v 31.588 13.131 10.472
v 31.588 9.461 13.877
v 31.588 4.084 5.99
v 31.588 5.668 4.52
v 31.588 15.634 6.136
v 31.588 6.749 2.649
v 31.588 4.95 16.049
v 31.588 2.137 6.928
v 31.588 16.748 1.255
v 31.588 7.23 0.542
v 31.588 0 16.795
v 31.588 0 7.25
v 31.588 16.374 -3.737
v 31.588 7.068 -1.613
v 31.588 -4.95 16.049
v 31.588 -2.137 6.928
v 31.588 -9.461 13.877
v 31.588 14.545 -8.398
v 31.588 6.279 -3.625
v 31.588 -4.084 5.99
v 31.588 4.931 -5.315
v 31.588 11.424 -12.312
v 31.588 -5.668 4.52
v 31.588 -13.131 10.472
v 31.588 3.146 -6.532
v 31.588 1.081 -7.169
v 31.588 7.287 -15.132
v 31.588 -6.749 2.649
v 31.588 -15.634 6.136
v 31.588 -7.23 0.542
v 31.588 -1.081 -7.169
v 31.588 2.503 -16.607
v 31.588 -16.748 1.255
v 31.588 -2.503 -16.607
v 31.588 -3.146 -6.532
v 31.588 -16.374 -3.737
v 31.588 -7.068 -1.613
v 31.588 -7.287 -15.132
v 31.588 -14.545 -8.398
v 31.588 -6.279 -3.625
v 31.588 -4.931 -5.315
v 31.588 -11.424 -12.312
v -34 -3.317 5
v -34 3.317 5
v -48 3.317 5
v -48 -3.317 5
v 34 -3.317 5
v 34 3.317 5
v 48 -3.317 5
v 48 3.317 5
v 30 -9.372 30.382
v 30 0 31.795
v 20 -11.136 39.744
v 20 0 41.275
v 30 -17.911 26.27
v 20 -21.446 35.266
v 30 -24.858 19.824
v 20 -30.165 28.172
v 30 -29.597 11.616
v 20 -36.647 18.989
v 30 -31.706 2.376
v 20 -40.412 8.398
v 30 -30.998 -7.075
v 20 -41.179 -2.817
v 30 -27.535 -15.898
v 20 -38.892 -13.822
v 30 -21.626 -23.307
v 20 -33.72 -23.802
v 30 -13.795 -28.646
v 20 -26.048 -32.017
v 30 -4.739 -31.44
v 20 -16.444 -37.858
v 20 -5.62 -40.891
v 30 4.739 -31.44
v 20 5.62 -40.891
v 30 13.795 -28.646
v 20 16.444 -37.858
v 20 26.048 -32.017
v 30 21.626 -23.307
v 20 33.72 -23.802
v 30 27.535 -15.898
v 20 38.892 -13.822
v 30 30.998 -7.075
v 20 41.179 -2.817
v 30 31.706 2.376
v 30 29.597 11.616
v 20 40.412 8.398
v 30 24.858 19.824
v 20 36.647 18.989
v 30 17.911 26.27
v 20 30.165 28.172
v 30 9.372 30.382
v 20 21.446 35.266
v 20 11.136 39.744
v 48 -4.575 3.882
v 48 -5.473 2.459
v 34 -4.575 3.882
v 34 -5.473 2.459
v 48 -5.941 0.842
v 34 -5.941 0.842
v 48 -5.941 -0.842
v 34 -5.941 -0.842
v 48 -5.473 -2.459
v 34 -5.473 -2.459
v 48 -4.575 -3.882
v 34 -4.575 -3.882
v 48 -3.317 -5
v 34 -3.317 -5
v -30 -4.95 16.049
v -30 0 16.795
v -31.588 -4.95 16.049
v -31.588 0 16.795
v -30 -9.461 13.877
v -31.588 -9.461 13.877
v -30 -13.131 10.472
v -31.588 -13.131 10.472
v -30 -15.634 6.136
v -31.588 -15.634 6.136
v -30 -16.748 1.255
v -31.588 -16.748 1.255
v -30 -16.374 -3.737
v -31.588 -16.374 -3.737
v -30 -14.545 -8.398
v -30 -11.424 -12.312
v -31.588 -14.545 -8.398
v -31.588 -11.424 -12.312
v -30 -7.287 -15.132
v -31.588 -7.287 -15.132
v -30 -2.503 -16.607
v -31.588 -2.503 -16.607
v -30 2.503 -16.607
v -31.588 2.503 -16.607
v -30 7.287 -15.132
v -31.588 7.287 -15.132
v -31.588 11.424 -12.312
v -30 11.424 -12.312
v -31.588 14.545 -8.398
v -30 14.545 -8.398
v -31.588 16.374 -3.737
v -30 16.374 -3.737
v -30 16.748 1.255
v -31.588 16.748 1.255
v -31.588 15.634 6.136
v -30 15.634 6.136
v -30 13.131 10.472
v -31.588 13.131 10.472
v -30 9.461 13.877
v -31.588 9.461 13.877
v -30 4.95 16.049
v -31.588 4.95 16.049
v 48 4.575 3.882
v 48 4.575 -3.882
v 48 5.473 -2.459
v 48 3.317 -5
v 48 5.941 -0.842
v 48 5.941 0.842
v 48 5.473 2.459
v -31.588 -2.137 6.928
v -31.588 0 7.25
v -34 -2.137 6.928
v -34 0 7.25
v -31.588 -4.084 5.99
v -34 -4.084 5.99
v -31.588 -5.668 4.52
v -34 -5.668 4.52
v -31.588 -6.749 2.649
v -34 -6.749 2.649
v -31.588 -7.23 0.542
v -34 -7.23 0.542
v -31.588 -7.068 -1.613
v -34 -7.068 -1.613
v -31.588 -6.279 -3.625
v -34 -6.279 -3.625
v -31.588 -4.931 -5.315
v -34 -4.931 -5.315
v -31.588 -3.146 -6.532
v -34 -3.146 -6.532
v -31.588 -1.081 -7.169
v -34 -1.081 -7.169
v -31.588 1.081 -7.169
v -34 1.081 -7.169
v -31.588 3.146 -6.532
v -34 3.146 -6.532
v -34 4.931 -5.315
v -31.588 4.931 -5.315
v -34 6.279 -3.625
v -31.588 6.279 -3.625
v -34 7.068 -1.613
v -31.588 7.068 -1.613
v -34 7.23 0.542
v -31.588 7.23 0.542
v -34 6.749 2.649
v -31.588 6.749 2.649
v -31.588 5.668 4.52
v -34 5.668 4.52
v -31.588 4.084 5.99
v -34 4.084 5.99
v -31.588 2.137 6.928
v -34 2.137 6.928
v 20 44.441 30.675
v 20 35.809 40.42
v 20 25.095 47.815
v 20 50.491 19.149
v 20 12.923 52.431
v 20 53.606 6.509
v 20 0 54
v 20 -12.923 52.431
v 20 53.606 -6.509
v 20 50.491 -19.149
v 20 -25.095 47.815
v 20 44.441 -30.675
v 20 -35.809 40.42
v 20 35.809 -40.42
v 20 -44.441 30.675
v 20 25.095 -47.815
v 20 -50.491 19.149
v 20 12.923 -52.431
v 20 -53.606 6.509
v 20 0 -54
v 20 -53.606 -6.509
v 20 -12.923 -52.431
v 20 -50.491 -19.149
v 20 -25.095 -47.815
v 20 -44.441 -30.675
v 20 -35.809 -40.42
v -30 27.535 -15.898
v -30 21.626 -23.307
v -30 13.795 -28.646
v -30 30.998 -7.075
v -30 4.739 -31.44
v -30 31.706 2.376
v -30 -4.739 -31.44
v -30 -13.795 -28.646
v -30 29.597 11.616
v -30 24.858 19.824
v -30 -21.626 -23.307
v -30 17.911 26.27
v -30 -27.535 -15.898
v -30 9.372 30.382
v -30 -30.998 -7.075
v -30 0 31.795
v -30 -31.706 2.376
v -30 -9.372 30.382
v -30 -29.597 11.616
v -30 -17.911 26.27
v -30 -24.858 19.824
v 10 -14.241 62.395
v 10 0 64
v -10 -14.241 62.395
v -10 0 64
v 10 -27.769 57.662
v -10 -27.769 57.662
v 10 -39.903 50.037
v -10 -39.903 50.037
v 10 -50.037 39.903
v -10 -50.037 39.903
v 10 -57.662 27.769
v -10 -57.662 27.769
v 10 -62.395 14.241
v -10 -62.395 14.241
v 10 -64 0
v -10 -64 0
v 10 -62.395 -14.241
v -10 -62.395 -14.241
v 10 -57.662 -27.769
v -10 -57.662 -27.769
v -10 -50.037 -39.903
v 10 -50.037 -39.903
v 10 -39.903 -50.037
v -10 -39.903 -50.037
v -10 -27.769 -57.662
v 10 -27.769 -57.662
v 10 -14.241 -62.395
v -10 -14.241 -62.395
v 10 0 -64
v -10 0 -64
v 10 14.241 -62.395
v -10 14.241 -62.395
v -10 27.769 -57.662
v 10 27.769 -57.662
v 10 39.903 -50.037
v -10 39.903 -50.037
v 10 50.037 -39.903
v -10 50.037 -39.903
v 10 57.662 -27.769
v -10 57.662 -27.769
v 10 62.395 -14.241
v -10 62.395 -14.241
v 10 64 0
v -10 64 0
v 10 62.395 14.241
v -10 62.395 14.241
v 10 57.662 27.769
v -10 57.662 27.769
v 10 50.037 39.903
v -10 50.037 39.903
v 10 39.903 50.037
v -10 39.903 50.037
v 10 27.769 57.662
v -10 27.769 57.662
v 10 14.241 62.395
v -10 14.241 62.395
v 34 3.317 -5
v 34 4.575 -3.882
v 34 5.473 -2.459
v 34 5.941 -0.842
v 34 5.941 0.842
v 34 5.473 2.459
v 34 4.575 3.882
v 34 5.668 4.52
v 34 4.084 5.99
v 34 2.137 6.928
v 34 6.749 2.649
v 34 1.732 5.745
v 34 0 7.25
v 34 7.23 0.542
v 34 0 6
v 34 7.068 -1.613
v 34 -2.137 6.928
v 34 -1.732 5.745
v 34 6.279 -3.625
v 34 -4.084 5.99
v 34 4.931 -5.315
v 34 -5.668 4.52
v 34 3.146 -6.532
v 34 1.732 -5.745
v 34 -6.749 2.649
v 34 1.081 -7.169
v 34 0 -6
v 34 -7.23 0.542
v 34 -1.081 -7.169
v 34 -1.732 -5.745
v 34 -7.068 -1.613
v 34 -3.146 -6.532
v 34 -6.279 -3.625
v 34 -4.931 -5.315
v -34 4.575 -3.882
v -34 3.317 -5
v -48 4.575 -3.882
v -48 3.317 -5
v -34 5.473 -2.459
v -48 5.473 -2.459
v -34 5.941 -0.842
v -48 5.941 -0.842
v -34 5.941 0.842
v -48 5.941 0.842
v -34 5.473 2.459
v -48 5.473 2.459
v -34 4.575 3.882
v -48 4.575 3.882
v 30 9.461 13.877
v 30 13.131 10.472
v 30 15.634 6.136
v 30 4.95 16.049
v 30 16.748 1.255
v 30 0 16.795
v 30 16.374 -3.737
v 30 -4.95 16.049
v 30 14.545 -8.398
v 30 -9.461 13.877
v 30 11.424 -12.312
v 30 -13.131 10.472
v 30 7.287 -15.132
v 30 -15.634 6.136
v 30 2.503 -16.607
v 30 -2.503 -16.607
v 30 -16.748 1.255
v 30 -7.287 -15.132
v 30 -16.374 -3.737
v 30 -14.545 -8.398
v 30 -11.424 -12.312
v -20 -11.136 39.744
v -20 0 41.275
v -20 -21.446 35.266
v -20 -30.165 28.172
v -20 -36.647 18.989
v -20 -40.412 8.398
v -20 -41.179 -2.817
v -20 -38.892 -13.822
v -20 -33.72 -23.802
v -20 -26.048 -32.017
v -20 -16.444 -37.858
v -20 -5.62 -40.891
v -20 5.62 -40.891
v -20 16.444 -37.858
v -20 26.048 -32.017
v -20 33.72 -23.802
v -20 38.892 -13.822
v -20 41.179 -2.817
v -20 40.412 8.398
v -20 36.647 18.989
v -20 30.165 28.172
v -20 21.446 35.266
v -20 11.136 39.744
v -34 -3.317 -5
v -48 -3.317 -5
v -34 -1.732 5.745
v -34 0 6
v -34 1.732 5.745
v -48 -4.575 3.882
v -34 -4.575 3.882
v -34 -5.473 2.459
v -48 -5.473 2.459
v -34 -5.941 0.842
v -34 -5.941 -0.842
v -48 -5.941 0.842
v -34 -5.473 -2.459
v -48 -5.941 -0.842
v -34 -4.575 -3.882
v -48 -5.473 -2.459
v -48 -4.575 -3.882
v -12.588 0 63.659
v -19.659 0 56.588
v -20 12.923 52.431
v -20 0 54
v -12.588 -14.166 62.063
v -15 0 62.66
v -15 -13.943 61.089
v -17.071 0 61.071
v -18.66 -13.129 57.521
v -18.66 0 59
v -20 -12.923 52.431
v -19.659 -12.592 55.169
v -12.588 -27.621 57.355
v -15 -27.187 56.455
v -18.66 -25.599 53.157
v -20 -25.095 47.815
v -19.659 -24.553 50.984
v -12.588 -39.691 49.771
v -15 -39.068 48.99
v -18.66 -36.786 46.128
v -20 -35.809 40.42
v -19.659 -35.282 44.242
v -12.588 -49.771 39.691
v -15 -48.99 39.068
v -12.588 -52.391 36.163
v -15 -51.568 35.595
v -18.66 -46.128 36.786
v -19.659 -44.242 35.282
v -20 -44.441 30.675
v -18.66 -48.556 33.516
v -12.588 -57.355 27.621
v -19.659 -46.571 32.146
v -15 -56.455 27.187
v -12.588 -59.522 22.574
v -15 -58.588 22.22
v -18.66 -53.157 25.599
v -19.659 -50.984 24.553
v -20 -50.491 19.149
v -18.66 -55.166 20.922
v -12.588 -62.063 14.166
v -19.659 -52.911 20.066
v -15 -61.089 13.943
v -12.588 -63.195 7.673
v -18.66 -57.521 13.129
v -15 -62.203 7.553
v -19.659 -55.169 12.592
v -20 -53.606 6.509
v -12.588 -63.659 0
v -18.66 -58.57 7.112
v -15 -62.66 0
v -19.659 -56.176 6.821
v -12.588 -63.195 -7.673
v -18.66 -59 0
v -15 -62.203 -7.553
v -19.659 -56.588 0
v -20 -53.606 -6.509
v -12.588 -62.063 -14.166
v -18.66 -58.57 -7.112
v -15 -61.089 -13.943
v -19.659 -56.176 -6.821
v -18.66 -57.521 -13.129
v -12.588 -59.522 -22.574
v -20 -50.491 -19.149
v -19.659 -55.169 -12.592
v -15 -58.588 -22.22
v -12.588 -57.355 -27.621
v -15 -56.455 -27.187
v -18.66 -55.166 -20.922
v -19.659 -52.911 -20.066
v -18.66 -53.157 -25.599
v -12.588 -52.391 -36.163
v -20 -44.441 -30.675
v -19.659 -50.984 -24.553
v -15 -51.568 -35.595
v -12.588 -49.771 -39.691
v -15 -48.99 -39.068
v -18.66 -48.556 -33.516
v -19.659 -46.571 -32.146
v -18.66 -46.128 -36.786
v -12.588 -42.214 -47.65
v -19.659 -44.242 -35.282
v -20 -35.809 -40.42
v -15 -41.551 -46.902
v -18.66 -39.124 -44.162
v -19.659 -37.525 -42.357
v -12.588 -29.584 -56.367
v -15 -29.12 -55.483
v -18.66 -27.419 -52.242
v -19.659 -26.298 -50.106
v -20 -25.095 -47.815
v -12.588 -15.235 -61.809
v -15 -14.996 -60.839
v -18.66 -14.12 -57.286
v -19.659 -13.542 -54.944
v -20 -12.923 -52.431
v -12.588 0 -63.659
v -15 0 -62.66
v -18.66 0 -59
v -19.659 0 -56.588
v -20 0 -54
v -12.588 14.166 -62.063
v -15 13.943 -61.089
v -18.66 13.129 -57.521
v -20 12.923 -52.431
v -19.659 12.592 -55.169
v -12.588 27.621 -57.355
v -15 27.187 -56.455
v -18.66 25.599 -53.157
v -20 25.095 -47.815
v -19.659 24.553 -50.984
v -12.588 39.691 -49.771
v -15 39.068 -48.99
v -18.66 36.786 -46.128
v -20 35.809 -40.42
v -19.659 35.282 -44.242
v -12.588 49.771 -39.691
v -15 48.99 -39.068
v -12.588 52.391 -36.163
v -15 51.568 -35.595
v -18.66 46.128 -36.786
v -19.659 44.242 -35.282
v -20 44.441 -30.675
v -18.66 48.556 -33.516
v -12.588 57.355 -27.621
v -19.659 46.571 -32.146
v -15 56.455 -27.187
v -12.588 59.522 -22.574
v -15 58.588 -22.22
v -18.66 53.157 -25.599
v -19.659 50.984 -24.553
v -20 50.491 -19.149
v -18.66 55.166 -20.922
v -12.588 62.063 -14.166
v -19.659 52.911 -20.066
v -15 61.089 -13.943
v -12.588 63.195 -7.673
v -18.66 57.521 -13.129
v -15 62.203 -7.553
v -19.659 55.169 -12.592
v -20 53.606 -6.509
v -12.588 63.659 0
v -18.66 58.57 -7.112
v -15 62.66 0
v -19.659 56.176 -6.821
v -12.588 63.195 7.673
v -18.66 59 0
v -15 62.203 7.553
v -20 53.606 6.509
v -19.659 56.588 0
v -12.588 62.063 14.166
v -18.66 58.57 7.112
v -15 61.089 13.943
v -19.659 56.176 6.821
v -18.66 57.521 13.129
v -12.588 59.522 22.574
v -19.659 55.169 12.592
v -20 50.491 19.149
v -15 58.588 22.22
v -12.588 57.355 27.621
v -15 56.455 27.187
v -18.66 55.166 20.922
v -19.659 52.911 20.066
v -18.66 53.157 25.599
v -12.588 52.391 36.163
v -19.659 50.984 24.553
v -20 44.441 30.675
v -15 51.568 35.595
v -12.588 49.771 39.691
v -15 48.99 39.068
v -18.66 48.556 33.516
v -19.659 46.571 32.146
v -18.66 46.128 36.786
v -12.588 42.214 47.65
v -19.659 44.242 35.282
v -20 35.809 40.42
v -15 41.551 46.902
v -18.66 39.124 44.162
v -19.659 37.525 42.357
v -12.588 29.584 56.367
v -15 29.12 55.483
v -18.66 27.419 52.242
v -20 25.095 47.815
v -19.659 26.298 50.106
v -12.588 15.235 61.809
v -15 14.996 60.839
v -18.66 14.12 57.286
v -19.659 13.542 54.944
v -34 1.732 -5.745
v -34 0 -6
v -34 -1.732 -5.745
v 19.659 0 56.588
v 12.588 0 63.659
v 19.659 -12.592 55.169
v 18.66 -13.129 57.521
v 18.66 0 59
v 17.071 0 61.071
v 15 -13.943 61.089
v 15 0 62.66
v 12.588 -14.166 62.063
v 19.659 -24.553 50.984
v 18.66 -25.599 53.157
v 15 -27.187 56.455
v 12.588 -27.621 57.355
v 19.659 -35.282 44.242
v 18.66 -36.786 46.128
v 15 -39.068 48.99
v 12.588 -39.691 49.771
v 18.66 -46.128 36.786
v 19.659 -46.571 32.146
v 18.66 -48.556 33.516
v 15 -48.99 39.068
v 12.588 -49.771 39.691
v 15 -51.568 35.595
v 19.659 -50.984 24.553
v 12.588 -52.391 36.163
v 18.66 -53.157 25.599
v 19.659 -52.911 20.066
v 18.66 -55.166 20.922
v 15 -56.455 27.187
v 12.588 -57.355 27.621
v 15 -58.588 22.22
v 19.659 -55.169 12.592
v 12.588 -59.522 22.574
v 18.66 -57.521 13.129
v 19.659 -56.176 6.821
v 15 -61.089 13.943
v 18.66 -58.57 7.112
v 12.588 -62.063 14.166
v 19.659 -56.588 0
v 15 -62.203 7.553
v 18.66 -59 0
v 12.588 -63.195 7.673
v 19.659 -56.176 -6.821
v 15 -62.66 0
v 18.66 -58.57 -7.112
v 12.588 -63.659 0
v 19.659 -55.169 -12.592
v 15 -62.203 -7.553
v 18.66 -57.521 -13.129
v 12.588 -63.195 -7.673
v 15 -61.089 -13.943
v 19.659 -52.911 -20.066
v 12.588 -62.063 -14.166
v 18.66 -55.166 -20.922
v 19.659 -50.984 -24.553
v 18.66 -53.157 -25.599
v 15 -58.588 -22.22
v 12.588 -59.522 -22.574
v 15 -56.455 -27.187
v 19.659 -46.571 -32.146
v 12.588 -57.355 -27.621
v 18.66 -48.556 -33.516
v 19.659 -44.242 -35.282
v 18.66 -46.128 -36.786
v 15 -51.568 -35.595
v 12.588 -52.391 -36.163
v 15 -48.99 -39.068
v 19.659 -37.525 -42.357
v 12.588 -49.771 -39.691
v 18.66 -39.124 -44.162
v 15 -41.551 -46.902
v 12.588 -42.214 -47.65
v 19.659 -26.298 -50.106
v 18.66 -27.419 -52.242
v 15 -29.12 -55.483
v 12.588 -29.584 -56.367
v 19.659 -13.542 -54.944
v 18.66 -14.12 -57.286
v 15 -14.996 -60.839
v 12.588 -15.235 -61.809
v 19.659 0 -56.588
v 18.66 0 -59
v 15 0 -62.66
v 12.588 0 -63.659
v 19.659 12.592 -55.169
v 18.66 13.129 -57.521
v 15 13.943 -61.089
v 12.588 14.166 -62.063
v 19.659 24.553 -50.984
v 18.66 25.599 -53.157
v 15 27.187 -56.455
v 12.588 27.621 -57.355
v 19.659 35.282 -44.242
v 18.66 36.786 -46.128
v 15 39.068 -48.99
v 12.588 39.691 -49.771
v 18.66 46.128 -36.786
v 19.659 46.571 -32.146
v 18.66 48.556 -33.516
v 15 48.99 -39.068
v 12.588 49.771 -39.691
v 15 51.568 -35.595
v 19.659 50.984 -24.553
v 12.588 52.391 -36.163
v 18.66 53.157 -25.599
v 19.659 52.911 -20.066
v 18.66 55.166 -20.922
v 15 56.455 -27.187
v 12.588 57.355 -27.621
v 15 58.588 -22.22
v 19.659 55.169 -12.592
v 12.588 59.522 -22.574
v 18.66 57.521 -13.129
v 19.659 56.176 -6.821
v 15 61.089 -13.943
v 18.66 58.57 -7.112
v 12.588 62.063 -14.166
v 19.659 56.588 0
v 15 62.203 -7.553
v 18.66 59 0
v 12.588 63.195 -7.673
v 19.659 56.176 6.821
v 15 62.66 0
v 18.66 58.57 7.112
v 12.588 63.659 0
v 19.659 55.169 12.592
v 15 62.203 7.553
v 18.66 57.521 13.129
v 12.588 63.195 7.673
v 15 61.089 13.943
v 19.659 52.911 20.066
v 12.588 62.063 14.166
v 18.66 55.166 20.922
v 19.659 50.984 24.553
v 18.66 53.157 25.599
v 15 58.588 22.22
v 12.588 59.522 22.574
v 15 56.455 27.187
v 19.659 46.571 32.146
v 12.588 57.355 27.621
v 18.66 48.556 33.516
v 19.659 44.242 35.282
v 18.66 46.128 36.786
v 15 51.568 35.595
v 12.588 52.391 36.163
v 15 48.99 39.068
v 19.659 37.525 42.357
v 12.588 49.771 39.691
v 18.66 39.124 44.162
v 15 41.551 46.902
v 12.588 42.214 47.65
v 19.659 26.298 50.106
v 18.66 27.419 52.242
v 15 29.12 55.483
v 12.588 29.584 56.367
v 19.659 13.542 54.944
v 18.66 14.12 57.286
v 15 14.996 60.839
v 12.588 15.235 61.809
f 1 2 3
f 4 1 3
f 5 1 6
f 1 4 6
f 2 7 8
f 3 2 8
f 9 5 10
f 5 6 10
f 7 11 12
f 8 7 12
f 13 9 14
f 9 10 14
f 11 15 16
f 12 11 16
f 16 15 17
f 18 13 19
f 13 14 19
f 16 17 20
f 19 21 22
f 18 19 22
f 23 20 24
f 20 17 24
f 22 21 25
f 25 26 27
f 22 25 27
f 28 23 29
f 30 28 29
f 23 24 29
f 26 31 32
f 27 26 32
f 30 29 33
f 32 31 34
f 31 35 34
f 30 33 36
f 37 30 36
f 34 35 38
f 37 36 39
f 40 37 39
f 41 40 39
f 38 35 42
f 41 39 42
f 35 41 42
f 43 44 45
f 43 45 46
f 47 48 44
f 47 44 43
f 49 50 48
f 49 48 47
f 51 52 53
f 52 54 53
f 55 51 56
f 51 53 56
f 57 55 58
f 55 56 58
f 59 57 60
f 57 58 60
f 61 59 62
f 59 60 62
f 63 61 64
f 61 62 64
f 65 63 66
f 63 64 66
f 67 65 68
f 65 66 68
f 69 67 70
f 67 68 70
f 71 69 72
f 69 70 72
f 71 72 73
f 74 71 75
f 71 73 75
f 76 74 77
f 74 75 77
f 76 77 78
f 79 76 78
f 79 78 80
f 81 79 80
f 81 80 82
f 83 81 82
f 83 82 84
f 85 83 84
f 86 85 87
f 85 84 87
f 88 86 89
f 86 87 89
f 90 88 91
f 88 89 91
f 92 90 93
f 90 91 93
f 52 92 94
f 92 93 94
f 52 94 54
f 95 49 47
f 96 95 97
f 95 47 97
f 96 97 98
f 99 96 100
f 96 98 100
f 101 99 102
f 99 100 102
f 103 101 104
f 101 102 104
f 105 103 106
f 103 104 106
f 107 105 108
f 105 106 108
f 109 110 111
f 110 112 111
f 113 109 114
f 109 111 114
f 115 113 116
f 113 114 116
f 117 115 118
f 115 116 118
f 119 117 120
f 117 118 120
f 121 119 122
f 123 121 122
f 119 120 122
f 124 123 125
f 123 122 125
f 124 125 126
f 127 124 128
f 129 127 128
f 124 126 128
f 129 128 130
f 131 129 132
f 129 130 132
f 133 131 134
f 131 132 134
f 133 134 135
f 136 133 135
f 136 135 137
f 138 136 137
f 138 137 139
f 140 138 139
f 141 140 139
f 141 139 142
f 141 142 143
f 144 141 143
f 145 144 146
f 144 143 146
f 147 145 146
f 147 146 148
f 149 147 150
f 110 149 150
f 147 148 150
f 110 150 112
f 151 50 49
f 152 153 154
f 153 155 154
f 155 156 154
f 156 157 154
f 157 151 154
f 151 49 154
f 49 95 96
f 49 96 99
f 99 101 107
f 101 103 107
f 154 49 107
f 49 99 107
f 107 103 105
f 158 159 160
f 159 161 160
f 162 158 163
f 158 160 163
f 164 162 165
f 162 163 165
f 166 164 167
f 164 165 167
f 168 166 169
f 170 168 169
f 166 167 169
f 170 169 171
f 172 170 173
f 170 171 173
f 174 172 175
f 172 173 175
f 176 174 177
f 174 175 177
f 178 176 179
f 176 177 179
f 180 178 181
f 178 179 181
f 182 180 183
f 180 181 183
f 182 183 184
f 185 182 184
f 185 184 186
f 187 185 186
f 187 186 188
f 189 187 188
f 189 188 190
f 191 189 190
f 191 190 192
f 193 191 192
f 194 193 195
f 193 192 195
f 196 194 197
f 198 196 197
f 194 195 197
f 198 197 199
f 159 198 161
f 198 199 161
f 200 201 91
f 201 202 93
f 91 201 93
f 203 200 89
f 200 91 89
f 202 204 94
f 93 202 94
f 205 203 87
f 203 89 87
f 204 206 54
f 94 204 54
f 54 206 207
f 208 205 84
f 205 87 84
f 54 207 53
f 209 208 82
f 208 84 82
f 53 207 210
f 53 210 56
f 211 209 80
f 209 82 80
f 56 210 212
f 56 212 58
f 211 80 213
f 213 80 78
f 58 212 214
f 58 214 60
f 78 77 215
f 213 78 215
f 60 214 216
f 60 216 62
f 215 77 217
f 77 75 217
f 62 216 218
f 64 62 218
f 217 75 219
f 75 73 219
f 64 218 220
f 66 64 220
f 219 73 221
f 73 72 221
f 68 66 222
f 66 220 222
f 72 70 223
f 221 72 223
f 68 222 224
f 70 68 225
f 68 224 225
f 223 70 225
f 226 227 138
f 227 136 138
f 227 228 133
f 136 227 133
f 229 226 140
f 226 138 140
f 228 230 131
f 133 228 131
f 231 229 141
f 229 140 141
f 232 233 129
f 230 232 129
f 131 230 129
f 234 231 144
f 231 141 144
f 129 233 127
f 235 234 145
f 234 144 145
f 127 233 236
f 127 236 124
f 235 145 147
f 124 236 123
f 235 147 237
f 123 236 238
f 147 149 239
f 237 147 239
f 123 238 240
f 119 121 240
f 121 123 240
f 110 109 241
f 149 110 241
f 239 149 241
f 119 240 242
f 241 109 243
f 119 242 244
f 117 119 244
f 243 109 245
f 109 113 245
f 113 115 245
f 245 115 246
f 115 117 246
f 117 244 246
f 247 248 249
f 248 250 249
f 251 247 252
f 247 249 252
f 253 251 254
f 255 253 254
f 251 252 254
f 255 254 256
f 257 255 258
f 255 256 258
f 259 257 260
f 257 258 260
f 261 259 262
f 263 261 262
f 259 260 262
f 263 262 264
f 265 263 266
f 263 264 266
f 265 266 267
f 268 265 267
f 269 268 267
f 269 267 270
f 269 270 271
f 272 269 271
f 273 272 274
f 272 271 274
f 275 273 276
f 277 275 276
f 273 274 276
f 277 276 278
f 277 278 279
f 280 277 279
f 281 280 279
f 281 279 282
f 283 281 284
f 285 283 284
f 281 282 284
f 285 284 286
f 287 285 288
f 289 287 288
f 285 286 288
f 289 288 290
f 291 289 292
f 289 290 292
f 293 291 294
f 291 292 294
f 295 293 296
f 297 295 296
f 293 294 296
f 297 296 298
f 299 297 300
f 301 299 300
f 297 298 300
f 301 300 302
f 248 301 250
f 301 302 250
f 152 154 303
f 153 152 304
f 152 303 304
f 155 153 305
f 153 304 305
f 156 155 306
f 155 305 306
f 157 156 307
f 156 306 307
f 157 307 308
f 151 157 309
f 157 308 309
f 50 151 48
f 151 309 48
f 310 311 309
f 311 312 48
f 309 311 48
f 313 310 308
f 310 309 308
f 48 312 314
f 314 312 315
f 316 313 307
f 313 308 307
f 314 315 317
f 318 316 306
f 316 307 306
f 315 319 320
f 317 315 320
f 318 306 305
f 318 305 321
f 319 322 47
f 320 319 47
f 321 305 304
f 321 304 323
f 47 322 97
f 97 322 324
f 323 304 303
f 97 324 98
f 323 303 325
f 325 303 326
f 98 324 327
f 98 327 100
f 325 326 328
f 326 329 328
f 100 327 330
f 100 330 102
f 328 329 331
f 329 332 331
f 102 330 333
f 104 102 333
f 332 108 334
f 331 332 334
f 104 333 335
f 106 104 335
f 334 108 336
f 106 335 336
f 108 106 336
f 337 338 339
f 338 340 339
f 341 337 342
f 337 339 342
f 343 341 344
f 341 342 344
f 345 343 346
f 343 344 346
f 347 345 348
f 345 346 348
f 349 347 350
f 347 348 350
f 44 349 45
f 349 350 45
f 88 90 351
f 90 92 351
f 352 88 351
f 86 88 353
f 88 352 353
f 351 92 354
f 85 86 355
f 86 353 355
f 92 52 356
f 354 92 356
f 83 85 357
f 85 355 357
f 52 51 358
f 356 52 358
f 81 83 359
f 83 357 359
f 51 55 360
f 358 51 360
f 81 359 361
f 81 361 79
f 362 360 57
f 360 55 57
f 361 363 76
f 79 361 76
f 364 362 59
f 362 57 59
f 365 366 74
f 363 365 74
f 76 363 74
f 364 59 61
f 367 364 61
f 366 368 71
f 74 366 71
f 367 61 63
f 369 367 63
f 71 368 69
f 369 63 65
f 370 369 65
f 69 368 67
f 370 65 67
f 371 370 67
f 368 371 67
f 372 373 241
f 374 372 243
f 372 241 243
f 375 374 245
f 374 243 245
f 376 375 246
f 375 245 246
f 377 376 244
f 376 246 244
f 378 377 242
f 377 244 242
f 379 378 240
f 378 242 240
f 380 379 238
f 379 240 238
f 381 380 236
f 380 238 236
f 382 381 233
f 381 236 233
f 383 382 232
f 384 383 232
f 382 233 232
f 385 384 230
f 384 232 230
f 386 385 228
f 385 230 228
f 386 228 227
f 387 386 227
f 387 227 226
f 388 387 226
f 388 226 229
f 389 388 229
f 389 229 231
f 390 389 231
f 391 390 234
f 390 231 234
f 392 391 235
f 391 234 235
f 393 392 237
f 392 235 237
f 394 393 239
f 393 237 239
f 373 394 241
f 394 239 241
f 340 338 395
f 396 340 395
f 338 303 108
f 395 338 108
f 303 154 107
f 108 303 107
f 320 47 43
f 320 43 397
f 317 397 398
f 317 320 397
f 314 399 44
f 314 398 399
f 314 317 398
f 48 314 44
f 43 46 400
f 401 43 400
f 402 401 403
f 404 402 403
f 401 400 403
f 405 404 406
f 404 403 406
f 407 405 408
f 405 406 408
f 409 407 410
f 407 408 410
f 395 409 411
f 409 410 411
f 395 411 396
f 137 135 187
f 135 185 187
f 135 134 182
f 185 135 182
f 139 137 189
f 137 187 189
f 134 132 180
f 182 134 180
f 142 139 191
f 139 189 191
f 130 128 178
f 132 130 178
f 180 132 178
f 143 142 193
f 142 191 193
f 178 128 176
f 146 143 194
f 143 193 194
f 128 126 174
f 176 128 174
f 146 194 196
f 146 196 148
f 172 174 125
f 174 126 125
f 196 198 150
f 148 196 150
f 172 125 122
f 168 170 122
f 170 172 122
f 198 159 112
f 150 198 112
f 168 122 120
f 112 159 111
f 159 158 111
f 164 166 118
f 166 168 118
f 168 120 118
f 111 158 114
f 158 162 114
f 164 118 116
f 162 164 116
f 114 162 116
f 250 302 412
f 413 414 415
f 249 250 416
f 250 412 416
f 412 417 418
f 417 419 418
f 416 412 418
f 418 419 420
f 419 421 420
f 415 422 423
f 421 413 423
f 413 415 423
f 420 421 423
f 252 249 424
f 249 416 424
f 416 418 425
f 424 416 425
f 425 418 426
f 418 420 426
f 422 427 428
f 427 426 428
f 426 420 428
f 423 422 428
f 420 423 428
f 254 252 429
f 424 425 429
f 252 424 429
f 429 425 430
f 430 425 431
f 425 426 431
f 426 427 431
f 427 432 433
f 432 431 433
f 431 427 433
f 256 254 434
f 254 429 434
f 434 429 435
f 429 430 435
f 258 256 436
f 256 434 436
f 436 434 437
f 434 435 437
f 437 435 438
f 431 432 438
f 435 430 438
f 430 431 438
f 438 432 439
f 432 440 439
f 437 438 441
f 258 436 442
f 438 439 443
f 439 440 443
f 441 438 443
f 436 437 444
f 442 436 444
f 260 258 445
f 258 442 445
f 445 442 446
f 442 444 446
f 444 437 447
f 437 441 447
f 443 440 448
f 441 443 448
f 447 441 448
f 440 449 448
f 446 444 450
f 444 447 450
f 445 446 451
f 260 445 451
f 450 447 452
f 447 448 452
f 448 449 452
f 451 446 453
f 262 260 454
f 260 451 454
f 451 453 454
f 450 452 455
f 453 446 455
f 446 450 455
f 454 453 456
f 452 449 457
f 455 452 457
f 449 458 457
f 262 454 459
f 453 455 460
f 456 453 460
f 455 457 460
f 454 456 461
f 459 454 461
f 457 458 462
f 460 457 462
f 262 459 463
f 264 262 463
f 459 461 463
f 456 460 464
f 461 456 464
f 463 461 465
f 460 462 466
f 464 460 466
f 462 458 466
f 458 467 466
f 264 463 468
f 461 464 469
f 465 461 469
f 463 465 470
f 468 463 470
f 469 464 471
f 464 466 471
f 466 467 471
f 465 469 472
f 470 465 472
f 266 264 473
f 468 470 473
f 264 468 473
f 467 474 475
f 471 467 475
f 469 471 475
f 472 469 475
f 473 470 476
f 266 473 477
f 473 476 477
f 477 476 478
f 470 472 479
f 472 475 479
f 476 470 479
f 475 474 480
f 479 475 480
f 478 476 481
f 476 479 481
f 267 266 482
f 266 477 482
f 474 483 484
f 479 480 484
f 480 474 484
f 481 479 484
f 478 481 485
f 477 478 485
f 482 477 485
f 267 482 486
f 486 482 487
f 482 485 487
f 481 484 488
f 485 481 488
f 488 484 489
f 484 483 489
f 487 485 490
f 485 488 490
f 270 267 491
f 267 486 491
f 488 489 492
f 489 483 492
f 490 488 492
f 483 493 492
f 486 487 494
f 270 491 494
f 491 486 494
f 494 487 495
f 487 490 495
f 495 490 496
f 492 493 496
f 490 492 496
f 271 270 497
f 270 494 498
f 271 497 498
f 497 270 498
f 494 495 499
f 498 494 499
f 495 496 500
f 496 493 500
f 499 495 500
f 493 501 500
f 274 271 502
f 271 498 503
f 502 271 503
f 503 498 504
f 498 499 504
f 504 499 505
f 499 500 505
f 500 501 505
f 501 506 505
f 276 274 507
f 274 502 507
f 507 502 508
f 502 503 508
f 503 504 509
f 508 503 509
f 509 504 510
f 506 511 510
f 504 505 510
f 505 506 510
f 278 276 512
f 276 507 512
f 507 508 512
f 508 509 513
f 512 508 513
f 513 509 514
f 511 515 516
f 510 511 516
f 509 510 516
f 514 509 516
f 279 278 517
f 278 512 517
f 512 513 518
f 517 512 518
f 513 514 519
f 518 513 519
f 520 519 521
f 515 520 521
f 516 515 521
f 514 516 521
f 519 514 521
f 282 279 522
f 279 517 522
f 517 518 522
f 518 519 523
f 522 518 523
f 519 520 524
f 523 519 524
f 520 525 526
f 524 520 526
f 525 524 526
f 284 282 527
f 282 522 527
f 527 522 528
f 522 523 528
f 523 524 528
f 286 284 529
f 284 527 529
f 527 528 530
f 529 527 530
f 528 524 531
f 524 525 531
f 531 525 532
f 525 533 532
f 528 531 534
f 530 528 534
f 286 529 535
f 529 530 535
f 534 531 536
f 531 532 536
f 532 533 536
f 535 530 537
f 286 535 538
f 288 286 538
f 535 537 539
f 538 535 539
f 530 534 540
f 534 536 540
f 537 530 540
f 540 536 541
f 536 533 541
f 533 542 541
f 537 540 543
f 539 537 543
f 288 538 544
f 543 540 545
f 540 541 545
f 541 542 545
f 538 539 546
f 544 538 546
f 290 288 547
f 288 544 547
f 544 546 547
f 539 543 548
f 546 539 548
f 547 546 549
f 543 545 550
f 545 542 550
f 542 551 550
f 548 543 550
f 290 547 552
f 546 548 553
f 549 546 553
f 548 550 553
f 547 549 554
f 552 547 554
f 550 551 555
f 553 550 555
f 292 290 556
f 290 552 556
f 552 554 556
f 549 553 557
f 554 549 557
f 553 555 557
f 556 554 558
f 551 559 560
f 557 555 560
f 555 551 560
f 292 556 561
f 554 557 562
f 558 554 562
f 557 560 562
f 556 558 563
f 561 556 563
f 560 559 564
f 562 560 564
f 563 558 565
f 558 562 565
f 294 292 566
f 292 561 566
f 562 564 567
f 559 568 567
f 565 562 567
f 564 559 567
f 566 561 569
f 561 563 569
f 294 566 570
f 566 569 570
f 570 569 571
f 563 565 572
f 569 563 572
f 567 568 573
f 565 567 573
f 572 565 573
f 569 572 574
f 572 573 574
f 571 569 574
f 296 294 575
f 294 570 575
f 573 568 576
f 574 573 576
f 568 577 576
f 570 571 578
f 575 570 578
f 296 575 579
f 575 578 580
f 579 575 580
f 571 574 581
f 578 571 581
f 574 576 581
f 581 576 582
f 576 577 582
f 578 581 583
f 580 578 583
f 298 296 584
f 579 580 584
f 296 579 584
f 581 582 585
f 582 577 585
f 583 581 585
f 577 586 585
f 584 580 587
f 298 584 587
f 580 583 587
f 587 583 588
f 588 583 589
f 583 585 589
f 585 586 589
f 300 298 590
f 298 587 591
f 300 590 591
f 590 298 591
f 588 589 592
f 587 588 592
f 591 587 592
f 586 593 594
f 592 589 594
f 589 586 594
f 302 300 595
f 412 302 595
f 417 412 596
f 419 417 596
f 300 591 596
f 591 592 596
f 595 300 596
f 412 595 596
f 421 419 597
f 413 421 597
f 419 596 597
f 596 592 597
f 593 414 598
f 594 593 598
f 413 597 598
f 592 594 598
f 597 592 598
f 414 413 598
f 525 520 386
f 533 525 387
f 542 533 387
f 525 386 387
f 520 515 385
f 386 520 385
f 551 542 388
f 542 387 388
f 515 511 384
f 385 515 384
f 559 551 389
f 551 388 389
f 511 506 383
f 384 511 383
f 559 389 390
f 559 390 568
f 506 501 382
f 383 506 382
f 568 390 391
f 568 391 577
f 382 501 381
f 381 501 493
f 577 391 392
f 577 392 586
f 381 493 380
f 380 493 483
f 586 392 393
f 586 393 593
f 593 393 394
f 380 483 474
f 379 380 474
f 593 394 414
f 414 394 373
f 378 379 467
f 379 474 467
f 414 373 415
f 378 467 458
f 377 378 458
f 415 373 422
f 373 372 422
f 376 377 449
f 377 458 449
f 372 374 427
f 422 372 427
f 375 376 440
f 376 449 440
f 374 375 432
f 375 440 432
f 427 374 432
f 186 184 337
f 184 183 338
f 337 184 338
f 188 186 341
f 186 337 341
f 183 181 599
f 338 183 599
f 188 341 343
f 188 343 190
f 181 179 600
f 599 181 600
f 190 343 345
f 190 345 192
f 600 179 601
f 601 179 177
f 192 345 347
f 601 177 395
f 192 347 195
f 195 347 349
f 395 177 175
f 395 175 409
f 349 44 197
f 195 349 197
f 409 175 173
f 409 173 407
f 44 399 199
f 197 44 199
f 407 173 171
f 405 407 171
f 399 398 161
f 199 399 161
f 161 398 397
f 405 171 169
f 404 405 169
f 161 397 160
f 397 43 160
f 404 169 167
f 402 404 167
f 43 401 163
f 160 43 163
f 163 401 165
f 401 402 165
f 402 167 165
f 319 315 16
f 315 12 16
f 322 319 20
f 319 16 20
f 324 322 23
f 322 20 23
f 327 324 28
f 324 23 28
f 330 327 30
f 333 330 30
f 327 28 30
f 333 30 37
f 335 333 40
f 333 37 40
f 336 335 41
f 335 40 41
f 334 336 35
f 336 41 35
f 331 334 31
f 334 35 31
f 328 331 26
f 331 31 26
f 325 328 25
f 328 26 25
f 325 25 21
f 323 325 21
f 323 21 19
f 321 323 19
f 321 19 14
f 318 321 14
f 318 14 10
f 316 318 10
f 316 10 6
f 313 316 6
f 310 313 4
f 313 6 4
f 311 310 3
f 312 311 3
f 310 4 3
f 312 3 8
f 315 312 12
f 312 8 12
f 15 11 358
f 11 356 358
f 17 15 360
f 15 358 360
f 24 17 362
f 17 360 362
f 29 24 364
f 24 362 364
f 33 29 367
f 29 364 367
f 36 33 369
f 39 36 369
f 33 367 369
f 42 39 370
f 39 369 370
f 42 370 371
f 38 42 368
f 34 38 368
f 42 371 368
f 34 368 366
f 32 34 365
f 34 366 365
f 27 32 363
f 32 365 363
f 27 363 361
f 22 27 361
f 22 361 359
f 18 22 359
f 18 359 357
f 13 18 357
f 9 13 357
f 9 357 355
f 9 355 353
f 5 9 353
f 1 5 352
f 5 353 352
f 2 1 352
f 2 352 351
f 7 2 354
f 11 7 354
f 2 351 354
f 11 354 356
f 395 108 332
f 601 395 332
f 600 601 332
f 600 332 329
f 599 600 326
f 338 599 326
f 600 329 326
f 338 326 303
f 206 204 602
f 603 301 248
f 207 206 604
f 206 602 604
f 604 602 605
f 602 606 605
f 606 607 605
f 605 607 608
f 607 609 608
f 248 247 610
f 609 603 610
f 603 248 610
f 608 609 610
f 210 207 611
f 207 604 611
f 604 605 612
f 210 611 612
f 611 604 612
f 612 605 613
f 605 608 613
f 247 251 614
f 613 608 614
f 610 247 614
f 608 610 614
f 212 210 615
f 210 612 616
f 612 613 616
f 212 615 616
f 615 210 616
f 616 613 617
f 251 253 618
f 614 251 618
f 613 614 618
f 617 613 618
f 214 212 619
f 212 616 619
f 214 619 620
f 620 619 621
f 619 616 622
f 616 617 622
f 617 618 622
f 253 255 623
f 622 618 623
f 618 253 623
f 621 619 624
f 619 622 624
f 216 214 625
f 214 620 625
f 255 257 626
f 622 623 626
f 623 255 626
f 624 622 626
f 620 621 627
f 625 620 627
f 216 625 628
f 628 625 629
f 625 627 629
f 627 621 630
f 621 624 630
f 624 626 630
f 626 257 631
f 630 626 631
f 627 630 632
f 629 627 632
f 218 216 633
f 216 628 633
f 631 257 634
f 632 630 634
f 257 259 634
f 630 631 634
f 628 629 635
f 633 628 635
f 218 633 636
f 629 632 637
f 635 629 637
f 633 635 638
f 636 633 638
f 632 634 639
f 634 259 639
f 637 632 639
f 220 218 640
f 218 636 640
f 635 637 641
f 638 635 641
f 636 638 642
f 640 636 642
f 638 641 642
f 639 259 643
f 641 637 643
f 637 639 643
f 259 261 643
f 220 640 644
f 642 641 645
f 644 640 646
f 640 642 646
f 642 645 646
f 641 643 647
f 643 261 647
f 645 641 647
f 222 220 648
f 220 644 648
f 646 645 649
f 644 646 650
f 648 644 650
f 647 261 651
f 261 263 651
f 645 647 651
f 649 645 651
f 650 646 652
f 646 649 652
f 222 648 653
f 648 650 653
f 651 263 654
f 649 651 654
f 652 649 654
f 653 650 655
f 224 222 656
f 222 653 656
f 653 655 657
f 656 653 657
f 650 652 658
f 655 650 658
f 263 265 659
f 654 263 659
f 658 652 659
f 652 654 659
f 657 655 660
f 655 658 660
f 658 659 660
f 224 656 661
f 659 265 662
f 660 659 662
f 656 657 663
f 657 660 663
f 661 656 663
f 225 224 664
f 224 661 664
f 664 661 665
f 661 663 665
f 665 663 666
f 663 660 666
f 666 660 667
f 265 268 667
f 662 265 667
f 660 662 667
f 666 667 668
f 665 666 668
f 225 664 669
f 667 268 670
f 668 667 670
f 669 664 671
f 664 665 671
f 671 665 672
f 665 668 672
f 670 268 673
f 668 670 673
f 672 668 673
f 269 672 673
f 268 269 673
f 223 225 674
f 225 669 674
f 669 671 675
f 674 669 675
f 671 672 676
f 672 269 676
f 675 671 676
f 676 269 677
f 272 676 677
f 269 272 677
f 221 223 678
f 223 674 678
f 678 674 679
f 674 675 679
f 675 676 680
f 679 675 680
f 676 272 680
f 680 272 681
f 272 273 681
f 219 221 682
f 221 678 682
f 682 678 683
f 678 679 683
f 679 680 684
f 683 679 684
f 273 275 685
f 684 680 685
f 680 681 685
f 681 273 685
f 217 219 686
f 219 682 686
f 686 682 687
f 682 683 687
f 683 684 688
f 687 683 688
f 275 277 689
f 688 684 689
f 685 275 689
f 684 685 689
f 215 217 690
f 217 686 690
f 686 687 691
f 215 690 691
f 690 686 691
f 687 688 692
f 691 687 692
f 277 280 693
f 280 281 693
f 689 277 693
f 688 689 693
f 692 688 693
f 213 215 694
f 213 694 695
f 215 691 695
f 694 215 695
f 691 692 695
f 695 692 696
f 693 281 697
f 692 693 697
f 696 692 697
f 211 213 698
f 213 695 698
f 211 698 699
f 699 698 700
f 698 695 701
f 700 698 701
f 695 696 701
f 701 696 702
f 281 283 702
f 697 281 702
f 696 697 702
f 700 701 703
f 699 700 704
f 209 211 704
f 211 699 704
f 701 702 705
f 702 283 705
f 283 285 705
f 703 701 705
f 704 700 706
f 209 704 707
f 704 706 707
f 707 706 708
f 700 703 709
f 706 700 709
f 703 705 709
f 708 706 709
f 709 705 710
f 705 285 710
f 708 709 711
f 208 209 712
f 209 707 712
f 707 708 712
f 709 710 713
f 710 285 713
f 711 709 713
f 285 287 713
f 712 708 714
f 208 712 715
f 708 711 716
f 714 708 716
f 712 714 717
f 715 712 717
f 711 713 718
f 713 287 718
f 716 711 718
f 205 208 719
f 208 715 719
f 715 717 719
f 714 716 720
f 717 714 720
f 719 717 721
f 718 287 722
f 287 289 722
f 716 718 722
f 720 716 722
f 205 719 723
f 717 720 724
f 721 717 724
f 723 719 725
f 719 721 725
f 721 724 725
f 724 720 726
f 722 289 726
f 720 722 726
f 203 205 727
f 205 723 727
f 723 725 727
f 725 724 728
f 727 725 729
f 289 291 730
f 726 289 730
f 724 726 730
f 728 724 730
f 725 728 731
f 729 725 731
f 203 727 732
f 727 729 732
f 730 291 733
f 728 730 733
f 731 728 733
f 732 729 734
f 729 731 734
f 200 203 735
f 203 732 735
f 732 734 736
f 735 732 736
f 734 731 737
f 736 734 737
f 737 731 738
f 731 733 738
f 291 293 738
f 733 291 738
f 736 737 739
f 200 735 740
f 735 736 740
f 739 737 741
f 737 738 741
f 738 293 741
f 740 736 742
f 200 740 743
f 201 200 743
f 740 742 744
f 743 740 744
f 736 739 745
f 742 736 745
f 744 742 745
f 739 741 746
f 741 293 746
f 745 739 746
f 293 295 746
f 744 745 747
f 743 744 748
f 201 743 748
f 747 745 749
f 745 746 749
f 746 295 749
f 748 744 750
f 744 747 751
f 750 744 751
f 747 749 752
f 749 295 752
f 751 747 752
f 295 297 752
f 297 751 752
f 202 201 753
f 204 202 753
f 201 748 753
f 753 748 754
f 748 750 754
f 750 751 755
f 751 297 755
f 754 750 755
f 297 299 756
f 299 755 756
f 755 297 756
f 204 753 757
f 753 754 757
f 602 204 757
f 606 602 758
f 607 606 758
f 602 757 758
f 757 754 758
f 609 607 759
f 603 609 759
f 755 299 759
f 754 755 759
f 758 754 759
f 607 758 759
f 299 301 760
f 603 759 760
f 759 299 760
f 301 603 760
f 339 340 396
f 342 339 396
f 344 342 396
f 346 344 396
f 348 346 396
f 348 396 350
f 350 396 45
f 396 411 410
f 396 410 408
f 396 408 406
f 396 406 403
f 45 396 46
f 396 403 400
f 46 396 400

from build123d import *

# Parameters (mm, degrees)
CUT_EXTRUDE1_START = -96
CUT_EXTRUDE1_DEPTH = 96


with BuildPart() as part:
    # Sketch2 → Revolve1 (revolve)
    with BuildSketch(Plane.XY, mode=Mode.PRIVATE) as revolve1_sk:
        with BuildLine():
            Line((10, 64), (-10, 64))
            ThreePointArc((-10, 64), (-17.071067812, 61.071067812), (-20, 54))
            Line((-20, 54), (-20, 41.275))
            Line((-20, 41.275), (-30, 31.795))
            Line((-30, 31.795), (-30, 16.795))
            Line((-30, 16.795), (-31.5875, 16.795))
            Line((-31.5875, 16.795), (-31.5875, 7.25))
            Line((-31.5875, 7.25), (-34, 7.25))
            Line((-34, 7.25), (-34, 6))
            Line((-34, 6), (-48, 6))
            Line((-48, 6), (-48, 0))
            Line((-48, 0), (48, 0))
            Line((48, 0), (48, 6))
            Line((48, 6), (34, 6))
            Line((34, 6), (34, 7.25))
            Line((34, 7.25), (31.5875, 7.25))
            Line((31.5875, 7.25), (31.5875, 16.795))
            Line((31.5875, 16.795), (30, 16.795))
            Line((30, 16.795), (30, 31.795))
            Line((30, 31.795), (20, 41.275))
            Line((20, 41.275), (20, 54))
            ThreePointArc((20, 54), (17.071067812, 61.071067812), (10, 64))
        make_face()
    revolve(revolve1_sk.sketch.rotate(Axis((-48, 0, 0), (1, 0, 0)), 90), axis=Axis((-48, 0, 0), (1, 0, 0)))

    # Sketch3 → Cut-Extrude1 (cut)
    with BuildSketch(Plane.ZY.offset(48).offset(CUT_EXTRUDE1_START)):
        with BuildLine():
            Line((5, 3.31662479), (5, -3.31662479))
            ThreePointArc((5, -3.31662479), (6, 0), (5, 3.31662479))
        make_face()
        with BuildLine():
            Line((-5, 3.31662479), (-5, -3.31662479))
            ThreePointArc((-5, -3.31662479), (-6, 0), (-5, 3.31662479))
        make_face()
    cut_extrude1 = extrude(amount=CUT_EXTRUDE1_DEPTH, mode=Mode.SUBTRACT)

    # Mirror1: Cut-Extrude1 across plane
    add(cut_extrude1.mirror(Plane(origin=(0, 0, 0), x_dir=(0, 0, 1), z_dir=(1, 0, 0))), mode=Mode.SUBTRACT)


solid = part.part
